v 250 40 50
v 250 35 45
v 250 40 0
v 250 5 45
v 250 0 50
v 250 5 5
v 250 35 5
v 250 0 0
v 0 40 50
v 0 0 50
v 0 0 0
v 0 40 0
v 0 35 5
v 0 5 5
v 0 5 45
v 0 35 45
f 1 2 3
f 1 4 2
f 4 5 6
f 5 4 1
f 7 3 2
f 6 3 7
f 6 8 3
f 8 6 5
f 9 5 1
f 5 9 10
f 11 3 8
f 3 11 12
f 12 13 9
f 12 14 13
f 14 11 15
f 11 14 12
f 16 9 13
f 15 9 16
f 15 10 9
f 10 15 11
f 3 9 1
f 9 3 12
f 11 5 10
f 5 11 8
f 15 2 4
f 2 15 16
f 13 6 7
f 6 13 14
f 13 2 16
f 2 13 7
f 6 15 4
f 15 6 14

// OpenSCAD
$fn = 32;

// ----------------------------------------------------------------------
// Box beam: 200-250 mm hollow beam
// ----------------------------------------------------------------------

// --- parameters (mm) ---
beam_l = 250;             // beam length, X
beam_w = 40;              // beam width, Y
beam_h = 50;              // beam height, Z
wall = 5;                 // wall thickness

difference() {
  cube([beam_l, beam_w, beam_h]);
  translate([-1, wall, wall])
    cube([beam_l + 2, beam_w - 2 * wall, beam_h - 2 * wall]);
}
